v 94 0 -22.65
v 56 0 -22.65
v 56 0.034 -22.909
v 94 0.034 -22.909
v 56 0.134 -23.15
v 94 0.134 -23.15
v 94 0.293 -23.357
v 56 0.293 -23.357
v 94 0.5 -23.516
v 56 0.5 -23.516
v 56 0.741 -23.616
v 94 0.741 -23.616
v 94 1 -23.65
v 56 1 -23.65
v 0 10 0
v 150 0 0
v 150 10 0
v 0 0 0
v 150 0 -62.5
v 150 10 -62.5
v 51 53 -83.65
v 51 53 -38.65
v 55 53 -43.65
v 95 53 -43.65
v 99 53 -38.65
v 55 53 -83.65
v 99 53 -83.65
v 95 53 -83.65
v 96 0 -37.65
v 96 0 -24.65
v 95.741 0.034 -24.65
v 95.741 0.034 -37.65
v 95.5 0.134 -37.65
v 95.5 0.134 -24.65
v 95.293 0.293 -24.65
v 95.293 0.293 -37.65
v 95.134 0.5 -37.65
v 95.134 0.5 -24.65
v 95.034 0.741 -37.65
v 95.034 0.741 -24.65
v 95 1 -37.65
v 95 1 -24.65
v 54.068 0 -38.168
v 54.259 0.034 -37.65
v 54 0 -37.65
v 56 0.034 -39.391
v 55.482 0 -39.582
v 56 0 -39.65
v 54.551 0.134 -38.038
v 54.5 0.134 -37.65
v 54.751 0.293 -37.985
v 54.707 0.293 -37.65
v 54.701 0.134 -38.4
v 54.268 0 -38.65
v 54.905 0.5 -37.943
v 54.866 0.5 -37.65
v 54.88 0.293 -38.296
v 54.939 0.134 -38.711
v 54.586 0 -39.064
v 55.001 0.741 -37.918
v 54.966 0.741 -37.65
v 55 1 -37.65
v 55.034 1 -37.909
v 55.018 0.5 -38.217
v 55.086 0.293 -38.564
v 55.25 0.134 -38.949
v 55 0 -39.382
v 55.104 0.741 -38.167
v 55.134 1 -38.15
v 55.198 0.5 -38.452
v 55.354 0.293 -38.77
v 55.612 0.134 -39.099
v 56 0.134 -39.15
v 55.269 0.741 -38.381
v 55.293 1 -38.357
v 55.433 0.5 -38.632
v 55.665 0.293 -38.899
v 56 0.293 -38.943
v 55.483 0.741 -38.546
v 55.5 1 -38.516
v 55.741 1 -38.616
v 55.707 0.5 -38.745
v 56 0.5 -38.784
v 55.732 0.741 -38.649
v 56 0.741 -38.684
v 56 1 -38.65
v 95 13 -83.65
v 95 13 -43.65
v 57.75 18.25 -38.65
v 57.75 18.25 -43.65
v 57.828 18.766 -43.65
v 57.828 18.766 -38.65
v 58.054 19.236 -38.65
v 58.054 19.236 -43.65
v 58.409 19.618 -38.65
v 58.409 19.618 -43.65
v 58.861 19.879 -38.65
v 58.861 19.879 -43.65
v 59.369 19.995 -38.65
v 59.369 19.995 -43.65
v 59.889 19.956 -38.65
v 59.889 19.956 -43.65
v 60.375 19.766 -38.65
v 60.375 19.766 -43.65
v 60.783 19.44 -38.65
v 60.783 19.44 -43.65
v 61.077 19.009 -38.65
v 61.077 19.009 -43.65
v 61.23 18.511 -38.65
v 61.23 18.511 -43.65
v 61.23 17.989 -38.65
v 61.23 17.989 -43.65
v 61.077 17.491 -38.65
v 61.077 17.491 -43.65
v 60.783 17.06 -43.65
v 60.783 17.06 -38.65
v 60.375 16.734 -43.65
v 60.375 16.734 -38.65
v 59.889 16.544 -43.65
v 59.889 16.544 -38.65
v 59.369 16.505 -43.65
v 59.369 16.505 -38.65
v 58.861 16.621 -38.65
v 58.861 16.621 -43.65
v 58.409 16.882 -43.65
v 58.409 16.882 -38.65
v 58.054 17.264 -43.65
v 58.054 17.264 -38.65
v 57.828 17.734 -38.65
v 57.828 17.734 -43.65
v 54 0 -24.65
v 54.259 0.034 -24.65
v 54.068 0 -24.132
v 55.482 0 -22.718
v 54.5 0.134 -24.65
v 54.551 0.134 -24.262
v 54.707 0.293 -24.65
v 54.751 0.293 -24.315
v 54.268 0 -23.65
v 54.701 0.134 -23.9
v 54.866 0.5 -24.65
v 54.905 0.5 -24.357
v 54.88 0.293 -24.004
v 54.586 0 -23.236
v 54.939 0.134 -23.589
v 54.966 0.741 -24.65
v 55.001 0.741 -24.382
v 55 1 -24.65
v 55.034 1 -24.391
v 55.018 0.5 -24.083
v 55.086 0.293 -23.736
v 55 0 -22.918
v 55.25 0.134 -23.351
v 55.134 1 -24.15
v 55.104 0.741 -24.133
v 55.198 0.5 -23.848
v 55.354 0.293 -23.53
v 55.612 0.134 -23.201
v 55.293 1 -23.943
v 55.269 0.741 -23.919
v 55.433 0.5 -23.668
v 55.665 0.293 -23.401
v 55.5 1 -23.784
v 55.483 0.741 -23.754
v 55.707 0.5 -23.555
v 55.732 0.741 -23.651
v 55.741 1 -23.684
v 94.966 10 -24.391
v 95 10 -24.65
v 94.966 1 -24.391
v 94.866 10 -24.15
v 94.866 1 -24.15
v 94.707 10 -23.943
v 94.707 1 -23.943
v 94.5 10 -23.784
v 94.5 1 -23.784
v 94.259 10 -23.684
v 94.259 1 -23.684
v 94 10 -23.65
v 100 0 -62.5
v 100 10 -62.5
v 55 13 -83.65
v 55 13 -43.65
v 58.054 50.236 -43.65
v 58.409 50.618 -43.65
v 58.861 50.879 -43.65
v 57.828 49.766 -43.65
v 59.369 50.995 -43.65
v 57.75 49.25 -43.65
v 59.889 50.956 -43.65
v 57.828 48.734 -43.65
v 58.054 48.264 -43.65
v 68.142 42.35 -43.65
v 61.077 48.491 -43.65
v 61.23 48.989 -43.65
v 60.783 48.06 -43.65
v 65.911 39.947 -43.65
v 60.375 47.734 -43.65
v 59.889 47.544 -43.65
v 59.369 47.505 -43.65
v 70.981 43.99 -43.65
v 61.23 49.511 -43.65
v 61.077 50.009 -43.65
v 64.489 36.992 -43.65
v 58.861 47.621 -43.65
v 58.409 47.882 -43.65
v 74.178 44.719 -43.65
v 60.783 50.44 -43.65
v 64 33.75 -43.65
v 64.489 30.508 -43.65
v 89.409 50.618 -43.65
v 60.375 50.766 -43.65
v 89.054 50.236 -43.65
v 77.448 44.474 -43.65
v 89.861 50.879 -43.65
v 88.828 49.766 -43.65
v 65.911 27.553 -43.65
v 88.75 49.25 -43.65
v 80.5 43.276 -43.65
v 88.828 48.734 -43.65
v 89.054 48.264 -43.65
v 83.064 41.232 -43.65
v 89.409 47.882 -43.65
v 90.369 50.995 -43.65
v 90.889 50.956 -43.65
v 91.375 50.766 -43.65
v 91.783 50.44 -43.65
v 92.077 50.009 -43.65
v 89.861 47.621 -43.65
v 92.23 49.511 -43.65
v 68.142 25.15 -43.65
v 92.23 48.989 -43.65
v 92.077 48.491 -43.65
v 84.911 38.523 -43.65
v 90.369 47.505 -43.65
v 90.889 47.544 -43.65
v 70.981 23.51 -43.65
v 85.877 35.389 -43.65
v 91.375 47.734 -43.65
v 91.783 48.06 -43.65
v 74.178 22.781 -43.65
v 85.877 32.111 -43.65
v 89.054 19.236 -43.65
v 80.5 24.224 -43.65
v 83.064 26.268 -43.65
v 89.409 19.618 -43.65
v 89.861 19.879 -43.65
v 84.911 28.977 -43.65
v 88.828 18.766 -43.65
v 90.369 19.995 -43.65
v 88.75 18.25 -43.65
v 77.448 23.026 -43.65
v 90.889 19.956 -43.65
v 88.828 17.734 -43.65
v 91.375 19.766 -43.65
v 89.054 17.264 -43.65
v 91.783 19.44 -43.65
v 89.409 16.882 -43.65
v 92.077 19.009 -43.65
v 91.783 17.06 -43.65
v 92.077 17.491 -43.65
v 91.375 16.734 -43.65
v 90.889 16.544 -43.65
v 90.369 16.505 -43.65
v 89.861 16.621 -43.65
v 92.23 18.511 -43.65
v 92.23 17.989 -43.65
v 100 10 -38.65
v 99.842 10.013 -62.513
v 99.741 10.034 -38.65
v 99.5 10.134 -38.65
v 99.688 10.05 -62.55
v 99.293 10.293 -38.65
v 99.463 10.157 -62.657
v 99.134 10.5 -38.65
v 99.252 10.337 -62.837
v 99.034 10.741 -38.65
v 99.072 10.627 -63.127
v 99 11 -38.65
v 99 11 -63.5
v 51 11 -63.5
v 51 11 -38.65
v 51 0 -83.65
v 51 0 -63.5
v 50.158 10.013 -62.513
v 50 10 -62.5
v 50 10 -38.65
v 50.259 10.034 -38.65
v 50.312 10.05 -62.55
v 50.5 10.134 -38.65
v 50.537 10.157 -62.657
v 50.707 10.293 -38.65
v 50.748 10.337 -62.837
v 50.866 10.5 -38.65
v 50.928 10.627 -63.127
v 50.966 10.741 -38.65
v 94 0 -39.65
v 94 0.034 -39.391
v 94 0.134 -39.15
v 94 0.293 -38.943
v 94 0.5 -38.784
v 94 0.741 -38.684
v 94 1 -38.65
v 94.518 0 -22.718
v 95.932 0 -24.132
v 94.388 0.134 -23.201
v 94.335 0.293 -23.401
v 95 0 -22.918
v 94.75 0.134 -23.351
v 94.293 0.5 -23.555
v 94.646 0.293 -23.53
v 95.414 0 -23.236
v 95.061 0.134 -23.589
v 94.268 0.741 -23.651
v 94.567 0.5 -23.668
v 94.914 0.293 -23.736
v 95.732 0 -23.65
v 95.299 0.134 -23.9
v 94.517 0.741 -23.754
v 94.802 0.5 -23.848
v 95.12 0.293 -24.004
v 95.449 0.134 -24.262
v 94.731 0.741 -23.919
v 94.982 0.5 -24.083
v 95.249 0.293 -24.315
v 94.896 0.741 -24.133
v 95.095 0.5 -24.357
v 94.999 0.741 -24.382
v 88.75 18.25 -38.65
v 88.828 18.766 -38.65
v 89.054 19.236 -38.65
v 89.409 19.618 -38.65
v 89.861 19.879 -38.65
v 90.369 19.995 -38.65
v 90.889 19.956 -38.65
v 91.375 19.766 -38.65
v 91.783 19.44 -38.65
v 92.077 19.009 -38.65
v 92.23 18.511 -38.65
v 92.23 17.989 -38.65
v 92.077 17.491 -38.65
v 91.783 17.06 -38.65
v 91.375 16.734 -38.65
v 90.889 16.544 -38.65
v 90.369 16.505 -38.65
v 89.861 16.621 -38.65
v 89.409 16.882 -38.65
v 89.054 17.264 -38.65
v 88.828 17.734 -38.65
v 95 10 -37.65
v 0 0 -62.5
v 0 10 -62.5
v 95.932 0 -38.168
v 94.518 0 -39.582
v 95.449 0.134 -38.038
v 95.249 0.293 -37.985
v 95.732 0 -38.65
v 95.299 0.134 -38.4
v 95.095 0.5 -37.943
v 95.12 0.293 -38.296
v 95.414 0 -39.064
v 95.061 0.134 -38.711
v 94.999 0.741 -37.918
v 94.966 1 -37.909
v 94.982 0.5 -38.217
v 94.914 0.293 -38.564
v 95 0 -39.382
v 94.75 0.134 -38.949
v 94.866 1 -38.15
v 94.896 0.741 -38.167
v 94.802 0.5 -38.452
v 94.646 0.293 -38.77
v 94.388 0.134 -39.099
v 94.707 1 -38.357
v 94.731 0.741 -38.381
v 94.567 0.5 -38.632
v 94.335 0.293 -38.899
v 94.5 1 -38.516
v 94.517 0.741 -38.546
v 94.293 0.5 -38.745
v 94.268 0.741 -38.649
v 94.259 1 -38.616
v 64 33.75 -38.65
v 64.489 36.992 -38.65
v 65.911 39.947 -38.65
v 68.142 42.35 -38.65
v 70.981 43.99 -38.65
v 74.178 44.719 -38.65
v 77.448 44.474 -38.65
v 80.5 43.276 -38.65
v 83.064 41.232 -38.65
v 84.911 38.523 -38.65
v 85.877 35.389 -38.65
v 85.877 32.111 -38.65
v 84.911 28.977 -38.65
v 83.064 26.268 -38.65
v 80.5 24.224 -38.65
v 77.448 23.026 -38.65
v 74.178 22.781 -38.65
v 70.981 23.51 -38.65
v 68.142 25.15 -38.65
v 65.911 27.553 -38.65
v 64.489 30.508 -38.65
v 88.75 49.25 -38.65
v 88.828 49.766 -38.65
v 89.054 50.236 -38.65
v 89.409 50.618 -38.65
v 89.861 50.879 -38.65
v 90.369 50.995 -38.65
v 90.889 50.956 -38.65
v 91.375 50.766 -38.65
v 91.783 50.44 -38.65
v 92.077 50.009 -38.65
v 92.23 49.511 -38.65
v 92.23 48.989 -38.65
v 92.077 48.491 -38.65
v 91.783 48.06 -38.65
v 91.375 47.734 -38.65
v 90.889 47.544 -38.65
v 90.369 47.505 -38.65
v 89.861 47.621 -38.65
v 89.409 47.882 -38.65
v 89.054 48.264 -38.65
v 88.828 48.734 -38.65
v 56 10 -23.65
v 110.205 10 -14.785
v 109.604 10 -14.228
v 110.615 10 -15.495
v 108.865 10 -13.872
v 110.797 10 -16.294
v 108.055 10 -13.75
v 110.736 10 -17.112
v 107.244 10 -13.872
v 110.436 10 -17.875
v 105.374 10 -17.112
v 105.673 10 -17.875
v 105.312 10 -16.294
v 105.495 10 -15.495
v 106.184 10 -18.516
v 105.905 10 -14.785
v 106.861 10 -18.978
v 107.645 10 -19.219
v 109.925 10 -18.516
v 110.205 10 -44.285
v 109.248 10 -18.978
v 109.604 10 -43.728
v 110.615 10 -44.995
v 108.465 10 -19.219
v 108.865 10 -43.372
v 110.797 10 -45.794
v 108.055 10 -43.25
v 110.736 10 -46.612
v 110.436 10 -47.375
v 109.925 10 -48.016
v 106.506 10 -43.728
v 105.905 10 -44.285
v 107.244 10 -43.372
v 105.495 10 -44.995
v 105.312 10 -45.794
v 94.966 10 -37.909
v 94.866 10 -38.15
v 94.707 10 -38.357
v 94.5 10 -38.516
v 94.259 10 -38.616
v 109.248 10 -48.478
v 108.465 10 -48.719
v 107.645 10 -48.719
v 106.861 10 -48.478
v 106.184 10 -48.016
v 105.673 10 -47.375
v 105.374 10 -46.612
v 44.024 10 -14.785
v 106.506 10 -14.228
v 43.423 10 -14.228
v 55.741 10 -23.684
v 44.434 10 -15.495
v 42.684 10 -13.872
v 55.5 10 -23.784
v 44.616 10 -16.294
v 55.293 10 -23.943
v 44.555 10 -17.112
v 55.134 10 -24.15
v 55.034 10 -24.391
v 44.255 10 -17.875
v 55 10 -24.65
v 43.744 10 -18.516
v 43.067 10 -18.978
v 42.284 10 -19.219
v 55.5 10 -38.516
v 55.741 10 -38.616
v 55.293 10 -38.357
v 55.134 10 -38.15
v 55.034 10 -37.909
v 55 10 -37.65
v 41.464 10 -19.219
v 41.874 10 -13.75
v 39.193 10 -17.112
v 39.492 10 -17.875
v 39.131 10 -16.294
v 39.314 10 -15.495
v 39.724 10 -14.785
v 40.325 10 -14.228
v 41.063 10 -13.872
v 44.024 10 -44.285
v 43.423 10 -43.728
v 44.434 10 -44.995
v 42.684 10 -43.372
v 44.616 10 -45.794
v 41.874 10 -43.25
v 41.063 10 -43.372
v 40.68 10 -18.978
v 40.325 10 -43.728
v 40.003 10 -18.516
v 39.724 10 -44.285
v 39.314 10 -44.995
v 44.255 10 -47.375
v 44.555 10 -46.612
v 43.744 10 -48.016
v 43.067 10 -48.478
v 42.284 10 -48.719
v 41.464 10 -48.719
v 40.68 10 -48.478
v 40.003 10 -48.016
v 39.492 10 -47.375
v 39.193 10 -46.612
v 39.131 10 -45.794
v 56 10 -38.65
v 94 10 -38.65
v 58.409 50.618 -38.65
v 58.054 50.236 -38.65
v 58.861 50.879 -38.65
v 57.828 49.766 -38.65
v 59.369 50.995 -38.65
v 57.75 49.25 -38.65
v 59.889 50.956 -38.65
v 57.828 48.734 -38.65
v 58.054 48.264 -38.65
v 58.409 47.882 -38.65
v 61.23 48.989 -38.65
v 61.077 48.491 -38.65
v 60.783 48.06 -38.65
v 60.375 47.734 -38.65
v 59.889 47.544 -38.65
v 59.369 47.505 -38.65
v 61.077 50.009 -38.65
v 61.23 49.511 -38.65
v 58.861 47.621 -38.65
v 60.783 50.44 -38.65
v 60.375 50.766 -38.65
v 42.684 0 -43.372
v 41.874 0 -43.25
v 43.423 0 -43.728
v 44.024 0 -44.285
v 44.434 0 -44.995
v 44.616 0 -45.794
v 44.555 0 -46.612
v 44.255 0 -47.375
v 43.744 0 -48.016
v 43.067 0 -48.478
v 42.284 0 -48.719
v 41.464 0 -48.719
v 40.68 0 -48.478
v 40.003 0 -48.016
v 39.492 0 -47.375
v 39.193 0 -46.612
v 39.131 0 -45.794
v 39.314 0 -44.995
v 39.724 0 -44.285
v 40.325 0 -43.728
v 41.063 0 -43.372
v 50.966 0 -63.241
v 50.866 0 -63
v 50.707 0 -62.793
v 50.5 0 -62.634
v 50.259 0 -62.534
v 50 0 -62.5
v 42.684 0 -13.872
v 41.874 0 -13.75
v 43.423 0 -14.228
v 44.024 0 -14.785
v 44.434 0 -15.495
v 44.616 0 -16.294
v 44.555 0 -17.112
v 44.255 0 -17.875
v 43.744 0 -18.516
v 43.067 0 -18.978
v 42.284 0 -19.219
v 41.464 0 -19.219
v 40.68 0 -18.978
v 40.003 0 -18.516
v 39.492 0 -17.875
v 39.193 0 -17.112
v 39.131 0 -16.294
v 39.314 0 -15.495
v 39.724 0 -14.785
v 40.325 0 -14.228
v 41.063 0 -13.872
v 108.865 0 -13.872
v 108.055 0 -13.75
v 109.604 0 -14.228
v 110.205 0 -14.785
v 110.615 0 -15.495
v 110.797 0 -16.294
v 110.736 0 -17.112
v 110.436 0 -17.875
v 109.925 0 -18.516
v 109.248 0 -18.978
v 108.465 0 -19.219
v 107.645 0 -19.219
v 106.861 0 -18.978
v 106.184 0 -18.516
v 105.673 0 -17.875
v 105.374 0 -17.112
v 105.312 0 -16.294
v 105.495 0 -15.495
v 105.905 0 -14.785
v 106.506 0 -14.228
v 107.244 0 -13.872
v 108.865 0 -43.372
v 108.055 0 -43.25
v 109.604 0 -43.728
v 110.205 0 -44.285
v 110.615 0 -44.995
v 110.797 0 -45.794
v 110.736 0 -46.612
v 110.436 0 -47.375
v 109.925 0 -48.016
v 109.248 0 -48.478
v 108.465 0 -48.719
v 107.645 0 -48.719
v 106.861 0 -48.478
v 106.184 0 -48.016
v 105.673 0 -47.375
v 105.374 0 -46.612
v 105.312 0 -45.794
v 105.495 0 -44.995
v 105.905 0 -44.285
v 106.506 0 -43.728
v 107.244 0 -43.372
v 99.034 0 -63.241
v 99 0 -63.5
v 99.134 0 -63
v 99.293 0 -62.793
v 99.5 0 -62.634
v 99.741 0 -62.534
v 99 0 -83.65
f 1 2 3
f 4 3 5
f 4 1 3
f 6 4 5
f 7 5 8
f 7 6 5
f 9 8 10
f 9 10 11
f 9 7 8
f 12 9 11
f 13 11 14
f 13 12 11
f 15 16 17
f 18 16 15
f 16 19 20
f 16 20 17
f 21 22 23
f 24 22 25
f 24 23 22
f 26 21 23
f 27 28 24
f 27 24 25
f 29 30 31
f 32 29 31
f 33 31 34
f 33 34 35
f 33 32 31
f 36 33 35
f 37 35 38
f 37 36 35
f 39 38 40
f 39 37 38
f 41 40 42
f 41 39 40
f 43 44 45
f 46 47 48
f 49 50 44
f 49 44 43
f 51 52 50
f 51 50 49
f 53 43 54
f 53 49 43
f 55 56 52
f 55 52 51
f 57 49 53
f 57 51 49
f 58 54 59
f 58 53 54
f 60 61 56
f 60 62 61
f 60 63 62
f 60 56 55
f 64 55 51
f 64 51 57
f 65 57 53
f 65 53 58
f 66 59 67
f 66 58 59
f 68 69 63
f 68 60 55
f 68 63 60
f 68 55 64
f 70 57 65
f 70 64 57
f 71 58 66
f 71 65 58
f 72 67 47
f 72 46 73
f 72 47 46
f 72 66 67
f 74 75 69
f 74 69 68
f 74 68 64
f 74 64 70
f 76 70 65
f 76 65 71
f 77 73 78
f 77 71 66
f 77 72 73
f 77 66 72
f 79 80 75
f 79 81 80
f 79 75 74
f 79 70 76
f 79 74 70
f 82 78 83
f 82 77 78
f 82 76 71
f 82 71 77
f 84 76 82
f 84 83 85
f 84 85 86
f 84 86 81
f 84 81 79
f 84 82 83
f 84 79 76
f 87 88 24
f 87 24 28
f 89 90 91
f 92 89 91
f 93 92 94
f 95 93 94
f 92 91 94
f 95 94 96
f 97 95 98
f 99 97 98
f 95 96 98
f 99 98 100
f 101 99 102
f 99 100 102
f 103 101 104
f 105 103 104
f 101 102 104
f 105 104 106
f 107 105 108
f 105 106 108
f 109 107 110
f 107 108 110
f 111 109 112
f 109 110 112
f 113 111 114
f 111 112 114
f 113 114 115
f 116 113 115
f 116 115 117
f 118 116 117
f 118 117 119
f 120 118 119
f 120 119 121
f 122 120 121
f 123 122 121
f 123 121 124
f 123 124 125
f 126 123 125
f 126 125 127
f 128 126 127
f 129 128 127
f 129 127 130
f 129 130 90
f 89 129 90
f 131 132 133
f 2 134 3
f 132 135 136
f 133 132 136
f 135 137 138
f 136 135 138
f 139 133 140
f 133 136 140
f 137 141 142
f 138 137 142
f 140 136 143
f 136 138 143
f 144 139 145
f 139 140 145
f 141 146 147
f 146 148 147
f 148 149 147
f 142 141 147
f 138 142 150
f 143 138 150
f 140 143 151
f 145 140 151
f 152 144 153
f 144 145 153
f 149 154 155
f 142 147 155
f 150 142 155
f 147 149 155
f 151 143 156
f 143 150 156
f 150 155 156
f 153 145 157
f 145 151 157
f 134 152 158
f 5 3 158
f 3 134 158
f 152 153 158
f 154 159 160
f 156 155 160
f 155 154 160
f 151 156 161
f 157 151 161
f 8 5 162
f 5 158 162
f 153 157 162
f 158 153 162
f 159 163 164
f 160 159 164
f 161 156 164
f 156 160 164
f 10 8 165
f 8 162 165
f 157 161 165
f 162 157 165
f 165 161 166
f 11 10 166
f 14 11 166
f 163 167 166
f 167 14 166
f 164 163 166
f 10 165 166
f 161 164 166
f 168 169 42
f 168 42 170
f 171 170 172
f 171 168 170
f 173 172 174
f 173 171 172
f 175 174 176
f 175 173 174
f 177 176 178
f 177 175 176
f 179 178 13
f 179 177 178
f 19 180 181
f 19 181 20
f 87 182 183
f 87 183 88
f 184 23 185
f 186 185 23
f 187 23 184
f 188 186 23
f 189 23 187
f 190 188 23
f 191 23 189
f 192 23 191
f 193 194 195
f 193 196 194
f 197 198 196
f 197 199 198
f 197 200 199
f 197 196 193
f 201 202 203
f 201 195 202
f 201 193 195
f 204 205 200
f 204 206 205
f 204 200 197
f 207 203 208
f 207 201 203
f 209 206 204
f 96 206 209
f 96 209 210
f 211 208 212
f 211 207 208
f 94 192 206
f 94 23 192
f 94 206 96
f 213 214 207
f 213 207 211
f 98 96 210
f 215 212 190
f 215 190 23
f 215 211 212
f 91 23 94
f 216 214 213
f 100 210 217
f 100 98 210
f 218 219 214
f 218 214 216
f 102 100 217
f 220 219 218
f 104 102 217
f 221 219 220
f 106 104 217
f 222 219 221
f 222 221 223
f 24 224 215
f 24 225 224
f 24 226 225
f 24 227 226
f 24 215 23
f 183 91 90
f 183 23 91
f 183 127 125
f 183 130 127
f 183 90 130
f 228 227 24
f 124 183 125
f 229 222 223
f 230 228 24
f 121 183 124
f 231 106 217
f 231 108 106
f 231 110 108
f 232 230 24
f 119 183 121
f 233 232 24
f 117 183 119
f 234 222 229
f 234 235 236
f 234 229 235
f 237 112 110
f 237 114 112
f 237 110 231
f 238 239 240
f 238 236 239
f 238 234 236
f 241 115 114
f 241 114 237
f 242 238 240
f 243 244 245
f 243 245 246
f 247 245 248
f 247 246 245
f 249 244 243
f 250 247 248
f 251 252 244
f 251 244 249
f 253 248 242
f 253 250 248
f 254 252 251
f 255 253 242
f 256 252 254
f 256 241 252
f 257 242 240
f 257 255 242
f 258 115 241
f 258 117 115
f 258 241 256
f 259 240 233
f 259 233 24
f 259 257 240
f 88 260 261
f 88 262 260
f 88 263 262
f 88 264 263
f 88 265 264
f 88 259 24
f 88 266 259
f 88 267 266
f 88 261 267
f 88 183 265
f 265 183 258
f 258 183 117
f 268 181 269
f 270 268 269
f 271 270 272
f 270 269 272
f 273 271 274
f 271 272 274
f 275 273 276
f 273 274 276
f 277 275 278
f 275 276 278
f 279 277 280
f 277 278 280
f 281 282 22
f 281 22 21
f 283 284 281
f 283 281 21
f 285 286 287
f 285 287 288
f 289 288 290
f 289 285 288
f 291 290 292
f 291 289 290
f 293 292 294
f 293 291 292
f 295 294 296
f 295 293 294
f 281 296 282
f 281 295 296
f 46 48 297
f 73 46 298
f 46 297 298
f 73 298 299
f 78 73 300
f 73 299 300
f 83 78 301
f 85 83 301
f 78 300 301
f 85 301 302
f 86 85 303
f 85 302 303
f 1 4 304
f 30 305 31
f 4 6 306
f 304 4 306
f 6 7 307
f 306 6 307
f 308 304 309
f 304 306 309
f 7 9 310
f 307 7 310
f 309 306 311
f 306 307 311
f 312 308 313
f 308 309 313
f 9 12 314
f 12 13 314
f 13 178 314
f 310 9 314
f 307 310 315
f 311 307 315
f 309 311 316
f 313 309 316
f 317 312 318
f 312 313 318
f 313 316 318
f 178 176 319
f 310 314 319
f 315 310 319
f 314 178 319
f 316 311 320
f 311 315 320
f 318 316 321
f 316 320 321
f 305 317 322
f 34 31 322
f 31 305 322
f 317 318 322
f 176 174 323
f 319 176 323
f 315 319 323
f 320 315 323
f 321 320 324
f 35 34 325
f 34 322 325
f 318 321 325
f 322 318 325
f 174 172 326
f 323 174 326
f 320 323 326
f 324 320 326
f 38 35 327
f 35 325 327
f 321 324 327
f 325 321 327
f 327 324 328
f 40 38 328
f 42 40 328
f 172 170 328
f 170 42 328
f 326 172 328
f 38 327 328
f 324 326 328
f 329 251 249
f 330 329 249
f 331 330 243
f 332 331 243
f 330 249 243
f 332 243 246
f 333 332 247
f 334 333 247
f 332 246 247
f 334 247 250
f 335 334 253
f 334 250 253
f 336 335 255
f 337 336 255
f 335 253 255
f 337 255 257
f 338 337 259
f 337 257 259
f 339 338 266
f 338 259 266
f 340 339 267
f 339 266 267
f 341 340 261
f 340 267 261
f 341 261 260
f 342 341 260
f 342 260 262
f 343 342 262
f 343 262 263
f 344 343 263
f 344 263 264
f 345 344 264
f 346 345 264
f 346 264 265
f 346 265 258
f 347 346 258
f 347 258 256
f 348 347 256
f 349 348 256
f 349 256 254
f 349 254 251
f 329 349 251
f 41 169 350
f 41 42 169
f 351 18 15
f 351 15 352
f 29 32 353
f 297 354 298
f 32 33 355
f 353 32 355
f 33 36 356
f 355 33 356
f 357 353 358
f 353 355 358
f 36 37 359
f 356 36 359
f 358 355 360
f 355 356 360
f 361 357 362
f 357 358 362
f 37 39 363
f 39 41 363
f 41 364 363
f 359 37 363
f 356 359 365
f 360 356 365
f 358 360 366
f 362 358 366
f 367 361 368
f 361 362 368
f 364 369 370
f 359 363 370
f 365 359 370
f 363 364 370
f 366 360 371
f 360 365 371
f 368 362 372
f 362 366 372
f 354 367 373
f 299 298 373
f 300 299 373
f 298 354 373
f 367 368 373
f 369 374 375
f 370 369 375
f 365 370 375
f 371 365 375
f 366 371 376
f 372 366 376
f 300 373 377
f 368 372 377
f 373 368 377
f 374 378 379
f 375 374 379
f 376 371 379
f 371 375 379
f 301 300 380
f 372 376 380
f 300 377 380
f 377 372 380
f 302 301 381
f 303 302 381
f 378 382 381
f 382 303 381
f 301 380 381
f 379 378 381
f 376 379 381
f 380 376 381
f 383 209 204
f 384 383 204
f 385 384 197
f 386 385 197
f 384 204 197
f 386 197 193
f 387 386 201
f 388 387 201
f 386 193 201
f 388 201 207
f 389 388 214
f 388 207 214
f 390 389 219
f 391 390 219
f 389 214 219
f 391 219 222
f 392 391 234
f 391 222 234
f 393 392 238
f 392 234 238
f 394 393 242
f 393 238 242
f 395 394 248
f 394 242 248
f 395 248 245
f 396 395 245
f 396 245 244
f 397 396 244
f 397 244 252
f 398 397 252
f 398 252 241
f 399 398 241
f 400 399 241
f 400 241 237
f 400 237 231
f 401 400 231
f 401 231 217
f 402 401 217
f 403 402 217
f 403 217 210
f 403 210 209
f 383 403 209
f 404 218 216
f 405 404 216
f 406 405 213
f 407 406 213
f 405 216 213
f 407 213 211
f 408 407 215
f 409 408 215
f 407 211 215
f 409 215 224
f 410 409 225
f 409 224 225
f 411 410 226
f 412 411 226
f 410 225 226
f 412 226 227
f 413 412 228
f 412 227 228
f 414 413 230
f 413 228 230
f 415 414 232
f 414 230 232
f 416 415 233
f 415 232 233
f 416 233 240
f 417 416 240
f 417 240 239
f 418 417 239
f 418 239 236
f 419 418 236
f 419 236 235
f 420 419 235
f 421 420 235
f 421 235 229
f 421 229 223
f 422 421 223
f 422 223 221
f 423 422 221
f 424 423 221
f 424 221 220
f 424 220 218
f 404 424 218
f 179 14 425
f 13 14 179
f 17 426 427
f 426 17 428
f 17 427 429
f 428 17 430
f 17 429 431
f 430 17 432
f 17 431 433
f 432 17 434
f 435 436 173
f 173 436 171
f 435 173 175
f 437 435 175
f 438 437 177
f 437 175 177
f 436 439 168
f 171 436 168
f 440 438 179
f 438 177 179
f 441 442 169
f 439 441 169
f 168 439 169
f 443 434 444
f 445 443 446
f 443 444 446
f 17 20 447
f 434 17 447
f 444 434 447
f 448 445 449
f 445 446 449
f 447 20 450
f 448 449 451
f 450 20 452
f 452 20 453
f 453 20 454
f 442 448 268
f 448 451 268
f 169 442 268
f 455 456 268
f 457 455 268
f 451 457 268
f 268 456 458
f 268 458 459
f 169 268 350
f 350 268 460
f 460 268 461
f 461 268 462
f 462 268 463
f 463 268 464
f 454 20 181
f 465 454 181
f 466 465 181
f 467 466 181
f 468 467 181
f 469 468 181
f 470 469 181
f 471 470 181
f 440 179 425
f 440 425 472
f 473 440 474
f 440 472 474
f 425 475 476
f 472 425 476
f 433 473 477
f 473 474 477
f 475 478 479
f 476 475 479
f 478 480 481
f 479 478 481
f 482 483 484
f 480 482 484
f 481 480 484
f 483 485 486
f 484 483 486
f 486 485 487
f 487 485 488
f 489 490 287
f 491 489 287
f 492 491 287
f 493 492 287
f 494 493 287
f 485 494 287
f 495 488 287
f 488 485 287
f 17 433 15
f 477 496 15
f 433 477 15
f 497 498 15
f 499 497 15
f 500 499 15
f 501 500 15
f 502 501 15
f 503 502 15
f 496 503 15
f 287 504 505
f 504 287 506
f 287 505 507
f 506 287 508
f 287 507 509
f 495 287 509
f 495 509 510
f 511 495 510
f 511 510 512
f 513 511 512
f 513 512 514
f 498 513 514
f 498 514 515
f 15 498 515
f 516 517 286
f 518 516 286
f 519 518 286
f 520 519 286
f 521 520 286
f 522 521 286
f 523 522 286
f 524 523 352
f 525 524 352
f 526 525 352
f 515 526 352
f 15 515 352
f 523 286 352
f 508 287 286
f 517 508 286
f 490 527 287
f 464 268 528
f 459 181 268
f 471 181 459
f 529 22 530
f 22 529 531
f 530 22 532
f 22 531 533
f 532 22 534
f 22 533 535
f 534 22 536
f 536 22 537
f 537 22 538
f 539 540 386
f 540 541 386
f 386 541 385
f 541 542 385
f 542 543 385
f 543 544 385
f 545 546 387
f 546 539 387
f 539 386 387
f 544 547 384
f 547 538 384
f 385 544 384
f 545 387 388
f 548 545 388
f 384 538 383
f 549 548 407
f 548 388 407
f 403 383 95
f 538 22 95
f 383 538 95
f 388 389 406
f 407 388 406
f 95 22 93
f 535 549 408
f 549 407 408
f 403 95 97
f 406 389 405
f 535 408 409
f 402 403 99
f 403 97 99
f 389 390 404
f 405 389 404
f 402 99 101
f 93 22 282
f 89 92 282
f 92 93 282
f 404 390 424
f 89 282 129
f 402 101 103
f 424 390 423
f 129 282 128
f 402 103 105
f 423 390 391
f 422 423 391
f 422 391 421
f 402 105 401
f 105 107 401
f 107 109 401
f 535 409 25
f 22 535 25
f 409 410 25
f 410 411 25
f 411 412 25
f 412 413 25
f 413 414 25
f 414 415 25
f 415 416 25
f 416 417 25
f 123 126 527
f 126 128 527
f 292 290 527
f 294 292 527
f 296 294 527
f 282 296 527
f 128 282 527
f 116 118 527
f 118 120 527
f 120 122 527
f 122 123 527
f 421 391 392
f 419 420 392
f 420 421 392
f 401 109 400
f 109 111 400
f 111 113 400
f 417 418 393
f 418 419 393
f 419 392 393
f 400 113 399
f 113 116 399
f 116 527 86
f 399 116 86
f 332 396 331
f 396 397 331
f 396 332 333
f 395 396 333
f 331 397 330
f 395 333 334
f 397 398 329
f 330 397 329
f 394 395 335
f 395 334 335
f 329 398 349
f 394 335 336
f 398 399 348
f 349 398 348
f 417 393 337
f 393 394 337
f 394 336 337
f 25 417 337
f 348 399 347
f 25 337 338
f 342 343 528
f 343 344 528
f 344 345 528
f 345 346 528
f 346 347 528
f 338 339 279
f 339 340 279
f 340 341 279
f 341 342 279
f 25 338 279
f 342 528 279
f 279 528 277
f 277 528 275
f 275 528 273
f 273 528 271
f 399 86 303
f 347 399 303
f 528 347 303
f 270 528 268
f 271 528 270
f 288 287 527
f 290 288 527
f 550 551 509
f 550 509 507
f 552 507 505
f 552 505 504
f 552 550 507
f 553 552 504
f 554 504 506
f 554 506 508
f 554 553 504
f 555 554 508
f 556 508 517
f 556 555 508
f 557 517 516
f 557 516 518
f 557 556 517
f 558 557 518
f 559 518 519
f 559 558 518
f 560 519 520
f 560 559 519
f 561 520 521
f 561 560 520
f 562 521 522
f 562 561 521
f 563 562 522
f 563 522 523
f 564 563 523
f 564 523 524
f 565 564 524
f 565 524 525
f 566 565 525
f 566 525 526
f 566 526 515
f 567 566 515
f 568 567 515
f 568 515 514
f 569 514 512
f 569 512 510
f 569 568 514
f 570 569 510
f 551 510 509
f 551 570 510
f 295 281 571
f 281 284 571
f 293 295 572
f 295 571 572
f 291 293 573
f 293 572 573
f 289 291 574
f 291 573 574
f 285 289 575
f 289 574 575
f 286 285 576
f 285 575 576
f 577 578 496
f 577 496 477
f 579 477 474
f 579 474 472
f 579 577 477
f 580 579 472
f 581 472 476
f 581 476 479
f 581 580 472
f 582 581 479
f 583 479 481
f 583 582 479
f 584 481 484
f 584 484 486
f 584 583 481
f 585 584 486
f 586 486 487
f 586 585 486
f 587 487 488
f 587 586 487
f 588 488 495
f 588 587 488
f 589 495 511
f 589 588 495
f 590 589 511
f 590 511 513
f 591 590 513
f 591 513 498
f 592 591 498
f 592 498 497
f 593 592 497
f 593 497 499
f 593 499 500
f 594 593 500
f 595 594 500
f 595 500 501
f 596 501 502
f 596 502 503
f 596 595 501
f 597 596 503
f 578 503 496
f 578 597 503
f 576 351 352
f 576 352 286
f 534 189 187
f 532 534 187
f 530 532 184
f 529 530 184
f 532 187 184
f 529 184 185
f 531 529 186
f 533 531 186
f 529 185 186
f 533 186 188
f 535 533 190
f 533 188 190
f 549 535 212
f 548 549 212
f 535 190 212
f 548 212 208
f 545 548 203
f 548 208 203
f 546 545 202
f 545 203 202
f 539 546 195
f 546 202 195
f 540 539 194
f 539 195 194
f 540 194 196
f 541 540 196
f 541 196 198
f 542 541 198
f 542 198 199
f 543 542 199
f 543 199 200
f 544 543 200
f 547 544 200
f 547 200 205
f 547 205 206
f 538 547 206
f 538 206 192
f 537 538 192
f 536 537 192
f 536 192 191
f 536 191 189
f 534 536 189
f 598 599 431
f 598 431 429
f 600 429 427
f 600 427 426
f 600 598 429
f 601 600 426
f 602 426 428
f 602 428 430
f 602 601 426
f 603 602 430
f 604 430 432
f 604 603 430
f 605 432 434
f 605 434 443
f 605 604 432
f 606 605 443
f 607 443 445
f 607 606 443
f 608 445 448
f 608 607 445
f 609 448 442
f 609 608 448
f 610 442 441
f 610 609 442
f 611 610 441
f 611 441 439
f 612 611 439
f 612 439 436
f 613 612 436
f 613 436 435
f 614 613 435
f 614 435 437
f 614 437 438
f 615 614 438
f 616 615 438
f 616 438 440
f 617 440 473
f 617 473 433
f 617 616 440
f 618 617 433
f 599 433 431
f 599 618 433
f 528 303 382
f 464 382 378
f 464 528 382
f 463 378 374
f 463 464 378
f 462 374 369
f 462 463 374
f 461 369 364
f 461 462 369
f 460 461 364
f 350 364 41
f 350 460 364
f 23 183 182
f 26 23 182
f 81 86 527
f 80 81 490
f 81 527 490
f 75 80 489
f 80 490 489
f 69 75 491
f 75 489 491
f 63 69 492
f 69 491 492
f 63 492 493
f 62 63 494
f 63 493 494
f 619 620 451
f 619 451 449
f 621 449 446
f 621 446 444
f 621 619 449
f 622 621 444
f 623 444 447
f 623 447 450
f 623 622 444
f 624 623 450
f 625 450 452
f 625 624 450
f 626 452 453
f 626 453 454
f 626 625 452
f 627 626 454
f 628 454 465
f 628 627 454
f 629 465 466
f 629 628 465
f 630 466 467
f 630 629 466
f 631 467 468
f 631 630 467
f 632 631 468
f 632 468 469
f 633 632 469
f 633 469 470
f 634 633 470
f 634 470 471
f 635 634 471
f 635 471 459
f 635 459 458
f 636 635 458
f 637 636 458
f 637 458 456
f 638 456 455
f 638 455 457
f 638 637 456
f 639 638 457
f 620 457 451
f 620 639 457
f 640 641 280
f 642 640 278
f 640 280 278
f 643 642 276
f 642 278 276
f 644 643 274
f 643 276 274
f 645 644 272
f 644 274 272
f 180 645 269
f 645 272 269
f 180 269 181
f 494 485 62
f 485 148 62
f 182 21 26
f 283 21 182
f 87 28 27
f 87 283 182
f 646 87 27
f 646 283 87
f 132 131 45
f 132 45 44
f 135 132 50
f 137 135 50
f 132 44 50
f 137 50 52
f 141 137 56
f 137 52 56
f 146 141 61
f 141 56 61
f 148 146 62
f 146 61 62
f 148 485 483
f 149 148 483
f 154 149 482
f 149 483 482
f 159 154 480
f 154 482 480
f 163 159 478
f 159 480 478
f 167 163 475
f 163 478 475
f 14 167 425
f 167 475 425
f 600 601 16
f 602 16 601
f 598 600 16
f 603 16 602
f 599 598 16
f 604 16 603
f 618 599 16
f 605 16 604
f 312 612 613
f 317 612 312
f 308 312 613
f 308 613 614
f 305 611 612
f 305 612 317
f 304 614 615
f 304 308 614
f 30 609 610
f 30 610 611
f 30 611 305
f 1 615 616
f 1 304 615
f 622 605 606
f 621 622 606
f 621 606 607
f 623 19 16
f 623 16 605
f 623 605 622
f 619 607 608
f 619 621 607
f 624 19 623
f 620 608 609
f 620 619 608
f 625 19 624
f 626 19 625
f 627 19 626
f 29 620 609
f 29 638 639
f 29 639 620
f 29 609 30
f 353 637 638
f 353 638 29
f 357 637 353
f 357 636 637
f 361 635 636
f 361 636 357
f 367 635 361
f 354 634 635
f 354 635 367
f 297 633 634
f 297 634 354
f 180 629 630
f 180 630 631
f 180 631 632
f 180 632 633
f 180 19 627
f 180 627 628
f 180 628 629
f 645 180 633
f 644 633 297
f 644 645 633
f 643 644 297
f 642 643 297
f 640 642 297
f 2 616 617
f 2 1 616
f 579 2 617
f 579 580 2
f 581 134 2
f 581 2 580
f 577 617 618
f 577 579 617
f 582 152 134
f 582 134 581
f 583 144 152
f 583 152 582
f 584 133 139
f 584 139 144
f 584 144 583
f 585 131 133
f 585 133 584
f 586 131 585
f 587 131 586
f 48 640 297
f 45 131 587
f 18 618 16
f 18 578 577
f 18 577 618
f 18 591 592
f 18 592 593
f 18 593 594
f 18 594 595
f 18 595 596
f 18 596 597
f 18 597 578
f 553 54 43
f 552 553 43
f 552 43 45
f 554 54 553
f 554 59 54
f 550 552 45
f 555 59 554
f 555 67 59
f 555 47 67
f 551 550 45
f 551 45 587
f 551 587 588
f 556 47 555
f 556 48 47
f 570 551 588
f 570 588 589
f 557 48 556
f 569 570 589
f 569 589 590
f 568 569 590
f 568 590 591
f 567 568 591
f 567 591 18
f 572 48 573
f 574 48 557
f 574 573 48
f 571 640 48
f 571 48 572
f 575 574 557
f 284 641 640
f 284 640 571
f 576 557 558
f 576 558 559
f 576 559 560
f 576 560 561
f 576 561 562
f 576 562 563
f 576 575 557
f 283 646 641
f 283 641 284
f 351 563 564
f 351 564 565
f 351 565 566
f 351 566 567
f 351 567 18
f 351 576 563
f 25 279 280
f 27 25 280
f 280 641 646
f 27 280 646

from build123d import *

# Parameters (mm, degrees)
SKETCH1_R            = 2.75
SKETCH1_W            = 40
SKETCH1_H            = 15
BOSS_EXTRUDE1_DEPTH  = 10
SKETCH3_W            = 40
SKETCH3_H            = 5
BOSS_EXTRUDE2_DEPTH  = 43
CUT_EXTRUDE1_REACH   = 166.968
SKETCH4_R            = 1.75
SKETCH4_R_2          = 11
SKETCH8_W            = 4
SKETCH8_H            = 45
BOSS_EXTRUDE4_DEPTH  = 43
SKETCH11_W           = 40
SKETCH11_H           = 40
BOSS_EXTRUDE15_DEPTH = 3
FILLET3_R            = 1
FILLET6_R            = 1
FILLET7_R            = 1


with BuildPart() as part:
    # Sketch1 → Boss-Extrude1 (new body)
    with BuildSketch(Plane(origin=(0, 0, 0), x_dir=(1, 0, 0), z_dir=(0, 1, 0))):
        Polygon((51, 62.5), (51, 83.65), (99, 83.65), (99, 62.5), (150, 62.5), (150, 0), (0, 0), (0, 62.5), align=None)
        with Locations(Location((108.05464, 46, 0), (0, 0, 270))):
            Circle(SKETCH1_R, mode=Mode.SUBTRACT)
        with Locations(Location((41.87366, 46, 0), (0, 0, 270))):
            Circle(SKETCH1_R, mode=Mode.SUBTRACT)
        with Locations(Location((41.87366, 16.5, 0), (0, 0, 270))):
            Circle(SKETCH1_R, mode=Mode.SUBTRACT)
        with Locations(Location((108.05464, 16.5, 0), (0, 0, 270))):
            Circle(SKETCH1_R, mode=Mode.SUBTRACT)
        with Locations((75, 31.15)):
            Rectangle(SKETCH1_W, SKETCH1_H, mode=Mode.SUBTRACT)
    extrude(amount=BOSS_EXTRUDE1_DEPTH)

    # Sketch3 → Boss-Extrude2 (add)
    with BuildSketch(Plane(origin=(0, 10, 0), x_dir=(1, 0, 0), z_dir=(0, 1, 0))):
        with Locations((75, 41.15)):
            Rectangle(SKETCH3_W, SKETCH3_H)
    extrude(amount=BOSS_EXTRUDE2_DEPTH)

    # Sketch4 → Cut-Extrude1 (cut, up to next)
    with BuildSketch(Plane(origin=(0, 0, -43.65), x_dir=(-1, 0, 0), z_dir=(0, 0, -1)), mode=Mode.PRIVATE) as cut_extrude1_sk1:
        with Locations((-59.5, 18.25)):
            Circle(SKETCH4_R)
    cut_extrude1_tool1 = extrude(cut_extrude1_sk1.sketch, amount=-CUT_EXTRUDE1_REACH, mode=Mode.PRIVATE) & part.part
    # Sketch4 → Cut-Extrude1 (cut, up to next)
    with BuildSketch(Plane(origin=(0, 0, -43.65), x_dir=(-1, 0, 0), z_dir=(0, 0, -1)), mode=Mode.PRIVATE) as cut_extrude1_sk2:
        with Locations((-90.5, 18.25)):
            Circle(SKETCH4_R)
    cut_extrude1_tool2 = extrude(cut_extrude1_sk2.sketch, amount=-CUT_EXTRUDE1_REACH, mode=Mode.PRIVATE) & part.part
    # Sketch4 → Cut-Extrude1 (cut, up to next)
    with BuildSketch(Plane(origin=(0, 0, -43.65), x_dir=(-1, 0, 0), z_dir=(0, 0, -1)), mode=Mode.PRIVATE) as cut_extrude1_sk3:
        with Locations((-75, 33.75)):
            Circle(SKETCH4_R_2)
    cut_extrude1_tool3 = extrude(cut_extrude1_sk3.sketch, amount=-CUT_EXTRUDE1_REACH, mode=Mode.PRIVATE) & part.part
    # Sketch4 → Cut-Extrude1 (cut, up to next)
    with BuildSketch(Plane(origin=(0, 0, -43.65), x_dir=(-1, 0, 0), z_dir=(0, 0, -1)), mode=Mode.PRIVATE) as cut_extrude1_sk4:
        with Locations((-90.5, 49.25)):
            Circle(SKETCH4_R)
    cut_extrude1_tool4 = extrude(cut_extrude1_sk4.sketch, amount=-CUT_EXTRUDE1_REACH, mode=Mode.PRIVATE) & part.part
    # Sketch4 → Cut-Extrude1 (cut, up to next)
    with BuildSketch(Plane(origin=(0, 0, -43.65), x_dir=(-1, 0, 0), z_dir=(0, 0, -1)), mode=Mode.PRIVATE) as cut_extrude1_sk5:
        with Locations((-59.5, 49.25)):
            Circle(SKETCH4_R)
    cut_extrude1_tool5 = extrude(cut_extrude1_sk5.sketch, amount=-CUT_EXTRUDE1_REACH, mode=Mode.PRIVATE) & part.part
    add(cut_extrude1_tool1.solids().sort_by_distance((59.5, 18.25, -43.65))[0], mode=Mode.SUBTRACT)
    add(cut_extrude1_tool2.solids().sort_by_distance((90.5, 18.25, -43.65))[0], mode=Mode.SUBTRACT)
    add(cut_extrude1_tool3.solids().sort_by_distance((75, 33.75, -43.65))[0], mode=Mode.SUBTRACT)
    add(cut_extrude1_tool4.solids().sort_by_distance((90.5, 49.25, -43.65))[0], mode=Mode.SUBTRACT)
    add(cut_extrude1_tool5.solids().sort_by_distance((59.5, 49.25, -43.65))[0], mode=Mode.SUBTRACT)

    # Sketch8 → Boss-Extrude4 (add)
    with BuildSketch(Plane(origin=(0, 10, 0), x_dir=(1, 0, 0), z_dir=(0, 1, 0))):
        with Locations((53, 61.15)):
            Rectangle(SKETCH8_W, SKETCH8_H)
        with Locations((97, 61.15)):
            Rectangle(SKETCH8_W, SKETCH8_H)
    extrude(amount=BOSS_EXTRUDE4_DEPTH)

    # Sketch11 → Boss-Extrude15 (add)
    with BuildSketch(Plane(origin=(0, 10, 0), x_dir=(1, 0, 0), z_dir=(0, 1, 0))):
        with Locations((75, 63.65)):
            Rectangle(SKETCH11_W, SKETCH11_H)
    extrude(amount=BOSS_EXTRUDE15_DEPTH)

    # Fillet3
    fillet3_edges = [part.edges().sort_by_distance(p)[0] for p in [
        (55, 0, -31.15),
        (75, 0, -23.65),
        (95, 0, -31.15),
        (75, 0, -38.65),
        (55, 5, -38.65),
        (55, 5, -23.65),
        (95, 5, -23.65),
        (95, 5, -38.65),
    ]]
    fillet(fillet3_edges, radius=FILLET3_R)

    # Fillet6
    fillet6_edges = [part.edges().sort_by_distance(p)[0] for p in [
        (99, 10, -50.575),
        (51, 10, -50.575),
    ]]
    fillet(fillet6_edges, radius=FILLET6_R)

    # Fillet7
    fillet7_edges = [part.edges().sort_by_distance(p)[0] for p in [
        (99, 5.5, -62.5),
        (51, 5.5, -62.5),
    ]]
    fillet(fillet7_edges, radius=FILLET7_R)


solid = part.part
